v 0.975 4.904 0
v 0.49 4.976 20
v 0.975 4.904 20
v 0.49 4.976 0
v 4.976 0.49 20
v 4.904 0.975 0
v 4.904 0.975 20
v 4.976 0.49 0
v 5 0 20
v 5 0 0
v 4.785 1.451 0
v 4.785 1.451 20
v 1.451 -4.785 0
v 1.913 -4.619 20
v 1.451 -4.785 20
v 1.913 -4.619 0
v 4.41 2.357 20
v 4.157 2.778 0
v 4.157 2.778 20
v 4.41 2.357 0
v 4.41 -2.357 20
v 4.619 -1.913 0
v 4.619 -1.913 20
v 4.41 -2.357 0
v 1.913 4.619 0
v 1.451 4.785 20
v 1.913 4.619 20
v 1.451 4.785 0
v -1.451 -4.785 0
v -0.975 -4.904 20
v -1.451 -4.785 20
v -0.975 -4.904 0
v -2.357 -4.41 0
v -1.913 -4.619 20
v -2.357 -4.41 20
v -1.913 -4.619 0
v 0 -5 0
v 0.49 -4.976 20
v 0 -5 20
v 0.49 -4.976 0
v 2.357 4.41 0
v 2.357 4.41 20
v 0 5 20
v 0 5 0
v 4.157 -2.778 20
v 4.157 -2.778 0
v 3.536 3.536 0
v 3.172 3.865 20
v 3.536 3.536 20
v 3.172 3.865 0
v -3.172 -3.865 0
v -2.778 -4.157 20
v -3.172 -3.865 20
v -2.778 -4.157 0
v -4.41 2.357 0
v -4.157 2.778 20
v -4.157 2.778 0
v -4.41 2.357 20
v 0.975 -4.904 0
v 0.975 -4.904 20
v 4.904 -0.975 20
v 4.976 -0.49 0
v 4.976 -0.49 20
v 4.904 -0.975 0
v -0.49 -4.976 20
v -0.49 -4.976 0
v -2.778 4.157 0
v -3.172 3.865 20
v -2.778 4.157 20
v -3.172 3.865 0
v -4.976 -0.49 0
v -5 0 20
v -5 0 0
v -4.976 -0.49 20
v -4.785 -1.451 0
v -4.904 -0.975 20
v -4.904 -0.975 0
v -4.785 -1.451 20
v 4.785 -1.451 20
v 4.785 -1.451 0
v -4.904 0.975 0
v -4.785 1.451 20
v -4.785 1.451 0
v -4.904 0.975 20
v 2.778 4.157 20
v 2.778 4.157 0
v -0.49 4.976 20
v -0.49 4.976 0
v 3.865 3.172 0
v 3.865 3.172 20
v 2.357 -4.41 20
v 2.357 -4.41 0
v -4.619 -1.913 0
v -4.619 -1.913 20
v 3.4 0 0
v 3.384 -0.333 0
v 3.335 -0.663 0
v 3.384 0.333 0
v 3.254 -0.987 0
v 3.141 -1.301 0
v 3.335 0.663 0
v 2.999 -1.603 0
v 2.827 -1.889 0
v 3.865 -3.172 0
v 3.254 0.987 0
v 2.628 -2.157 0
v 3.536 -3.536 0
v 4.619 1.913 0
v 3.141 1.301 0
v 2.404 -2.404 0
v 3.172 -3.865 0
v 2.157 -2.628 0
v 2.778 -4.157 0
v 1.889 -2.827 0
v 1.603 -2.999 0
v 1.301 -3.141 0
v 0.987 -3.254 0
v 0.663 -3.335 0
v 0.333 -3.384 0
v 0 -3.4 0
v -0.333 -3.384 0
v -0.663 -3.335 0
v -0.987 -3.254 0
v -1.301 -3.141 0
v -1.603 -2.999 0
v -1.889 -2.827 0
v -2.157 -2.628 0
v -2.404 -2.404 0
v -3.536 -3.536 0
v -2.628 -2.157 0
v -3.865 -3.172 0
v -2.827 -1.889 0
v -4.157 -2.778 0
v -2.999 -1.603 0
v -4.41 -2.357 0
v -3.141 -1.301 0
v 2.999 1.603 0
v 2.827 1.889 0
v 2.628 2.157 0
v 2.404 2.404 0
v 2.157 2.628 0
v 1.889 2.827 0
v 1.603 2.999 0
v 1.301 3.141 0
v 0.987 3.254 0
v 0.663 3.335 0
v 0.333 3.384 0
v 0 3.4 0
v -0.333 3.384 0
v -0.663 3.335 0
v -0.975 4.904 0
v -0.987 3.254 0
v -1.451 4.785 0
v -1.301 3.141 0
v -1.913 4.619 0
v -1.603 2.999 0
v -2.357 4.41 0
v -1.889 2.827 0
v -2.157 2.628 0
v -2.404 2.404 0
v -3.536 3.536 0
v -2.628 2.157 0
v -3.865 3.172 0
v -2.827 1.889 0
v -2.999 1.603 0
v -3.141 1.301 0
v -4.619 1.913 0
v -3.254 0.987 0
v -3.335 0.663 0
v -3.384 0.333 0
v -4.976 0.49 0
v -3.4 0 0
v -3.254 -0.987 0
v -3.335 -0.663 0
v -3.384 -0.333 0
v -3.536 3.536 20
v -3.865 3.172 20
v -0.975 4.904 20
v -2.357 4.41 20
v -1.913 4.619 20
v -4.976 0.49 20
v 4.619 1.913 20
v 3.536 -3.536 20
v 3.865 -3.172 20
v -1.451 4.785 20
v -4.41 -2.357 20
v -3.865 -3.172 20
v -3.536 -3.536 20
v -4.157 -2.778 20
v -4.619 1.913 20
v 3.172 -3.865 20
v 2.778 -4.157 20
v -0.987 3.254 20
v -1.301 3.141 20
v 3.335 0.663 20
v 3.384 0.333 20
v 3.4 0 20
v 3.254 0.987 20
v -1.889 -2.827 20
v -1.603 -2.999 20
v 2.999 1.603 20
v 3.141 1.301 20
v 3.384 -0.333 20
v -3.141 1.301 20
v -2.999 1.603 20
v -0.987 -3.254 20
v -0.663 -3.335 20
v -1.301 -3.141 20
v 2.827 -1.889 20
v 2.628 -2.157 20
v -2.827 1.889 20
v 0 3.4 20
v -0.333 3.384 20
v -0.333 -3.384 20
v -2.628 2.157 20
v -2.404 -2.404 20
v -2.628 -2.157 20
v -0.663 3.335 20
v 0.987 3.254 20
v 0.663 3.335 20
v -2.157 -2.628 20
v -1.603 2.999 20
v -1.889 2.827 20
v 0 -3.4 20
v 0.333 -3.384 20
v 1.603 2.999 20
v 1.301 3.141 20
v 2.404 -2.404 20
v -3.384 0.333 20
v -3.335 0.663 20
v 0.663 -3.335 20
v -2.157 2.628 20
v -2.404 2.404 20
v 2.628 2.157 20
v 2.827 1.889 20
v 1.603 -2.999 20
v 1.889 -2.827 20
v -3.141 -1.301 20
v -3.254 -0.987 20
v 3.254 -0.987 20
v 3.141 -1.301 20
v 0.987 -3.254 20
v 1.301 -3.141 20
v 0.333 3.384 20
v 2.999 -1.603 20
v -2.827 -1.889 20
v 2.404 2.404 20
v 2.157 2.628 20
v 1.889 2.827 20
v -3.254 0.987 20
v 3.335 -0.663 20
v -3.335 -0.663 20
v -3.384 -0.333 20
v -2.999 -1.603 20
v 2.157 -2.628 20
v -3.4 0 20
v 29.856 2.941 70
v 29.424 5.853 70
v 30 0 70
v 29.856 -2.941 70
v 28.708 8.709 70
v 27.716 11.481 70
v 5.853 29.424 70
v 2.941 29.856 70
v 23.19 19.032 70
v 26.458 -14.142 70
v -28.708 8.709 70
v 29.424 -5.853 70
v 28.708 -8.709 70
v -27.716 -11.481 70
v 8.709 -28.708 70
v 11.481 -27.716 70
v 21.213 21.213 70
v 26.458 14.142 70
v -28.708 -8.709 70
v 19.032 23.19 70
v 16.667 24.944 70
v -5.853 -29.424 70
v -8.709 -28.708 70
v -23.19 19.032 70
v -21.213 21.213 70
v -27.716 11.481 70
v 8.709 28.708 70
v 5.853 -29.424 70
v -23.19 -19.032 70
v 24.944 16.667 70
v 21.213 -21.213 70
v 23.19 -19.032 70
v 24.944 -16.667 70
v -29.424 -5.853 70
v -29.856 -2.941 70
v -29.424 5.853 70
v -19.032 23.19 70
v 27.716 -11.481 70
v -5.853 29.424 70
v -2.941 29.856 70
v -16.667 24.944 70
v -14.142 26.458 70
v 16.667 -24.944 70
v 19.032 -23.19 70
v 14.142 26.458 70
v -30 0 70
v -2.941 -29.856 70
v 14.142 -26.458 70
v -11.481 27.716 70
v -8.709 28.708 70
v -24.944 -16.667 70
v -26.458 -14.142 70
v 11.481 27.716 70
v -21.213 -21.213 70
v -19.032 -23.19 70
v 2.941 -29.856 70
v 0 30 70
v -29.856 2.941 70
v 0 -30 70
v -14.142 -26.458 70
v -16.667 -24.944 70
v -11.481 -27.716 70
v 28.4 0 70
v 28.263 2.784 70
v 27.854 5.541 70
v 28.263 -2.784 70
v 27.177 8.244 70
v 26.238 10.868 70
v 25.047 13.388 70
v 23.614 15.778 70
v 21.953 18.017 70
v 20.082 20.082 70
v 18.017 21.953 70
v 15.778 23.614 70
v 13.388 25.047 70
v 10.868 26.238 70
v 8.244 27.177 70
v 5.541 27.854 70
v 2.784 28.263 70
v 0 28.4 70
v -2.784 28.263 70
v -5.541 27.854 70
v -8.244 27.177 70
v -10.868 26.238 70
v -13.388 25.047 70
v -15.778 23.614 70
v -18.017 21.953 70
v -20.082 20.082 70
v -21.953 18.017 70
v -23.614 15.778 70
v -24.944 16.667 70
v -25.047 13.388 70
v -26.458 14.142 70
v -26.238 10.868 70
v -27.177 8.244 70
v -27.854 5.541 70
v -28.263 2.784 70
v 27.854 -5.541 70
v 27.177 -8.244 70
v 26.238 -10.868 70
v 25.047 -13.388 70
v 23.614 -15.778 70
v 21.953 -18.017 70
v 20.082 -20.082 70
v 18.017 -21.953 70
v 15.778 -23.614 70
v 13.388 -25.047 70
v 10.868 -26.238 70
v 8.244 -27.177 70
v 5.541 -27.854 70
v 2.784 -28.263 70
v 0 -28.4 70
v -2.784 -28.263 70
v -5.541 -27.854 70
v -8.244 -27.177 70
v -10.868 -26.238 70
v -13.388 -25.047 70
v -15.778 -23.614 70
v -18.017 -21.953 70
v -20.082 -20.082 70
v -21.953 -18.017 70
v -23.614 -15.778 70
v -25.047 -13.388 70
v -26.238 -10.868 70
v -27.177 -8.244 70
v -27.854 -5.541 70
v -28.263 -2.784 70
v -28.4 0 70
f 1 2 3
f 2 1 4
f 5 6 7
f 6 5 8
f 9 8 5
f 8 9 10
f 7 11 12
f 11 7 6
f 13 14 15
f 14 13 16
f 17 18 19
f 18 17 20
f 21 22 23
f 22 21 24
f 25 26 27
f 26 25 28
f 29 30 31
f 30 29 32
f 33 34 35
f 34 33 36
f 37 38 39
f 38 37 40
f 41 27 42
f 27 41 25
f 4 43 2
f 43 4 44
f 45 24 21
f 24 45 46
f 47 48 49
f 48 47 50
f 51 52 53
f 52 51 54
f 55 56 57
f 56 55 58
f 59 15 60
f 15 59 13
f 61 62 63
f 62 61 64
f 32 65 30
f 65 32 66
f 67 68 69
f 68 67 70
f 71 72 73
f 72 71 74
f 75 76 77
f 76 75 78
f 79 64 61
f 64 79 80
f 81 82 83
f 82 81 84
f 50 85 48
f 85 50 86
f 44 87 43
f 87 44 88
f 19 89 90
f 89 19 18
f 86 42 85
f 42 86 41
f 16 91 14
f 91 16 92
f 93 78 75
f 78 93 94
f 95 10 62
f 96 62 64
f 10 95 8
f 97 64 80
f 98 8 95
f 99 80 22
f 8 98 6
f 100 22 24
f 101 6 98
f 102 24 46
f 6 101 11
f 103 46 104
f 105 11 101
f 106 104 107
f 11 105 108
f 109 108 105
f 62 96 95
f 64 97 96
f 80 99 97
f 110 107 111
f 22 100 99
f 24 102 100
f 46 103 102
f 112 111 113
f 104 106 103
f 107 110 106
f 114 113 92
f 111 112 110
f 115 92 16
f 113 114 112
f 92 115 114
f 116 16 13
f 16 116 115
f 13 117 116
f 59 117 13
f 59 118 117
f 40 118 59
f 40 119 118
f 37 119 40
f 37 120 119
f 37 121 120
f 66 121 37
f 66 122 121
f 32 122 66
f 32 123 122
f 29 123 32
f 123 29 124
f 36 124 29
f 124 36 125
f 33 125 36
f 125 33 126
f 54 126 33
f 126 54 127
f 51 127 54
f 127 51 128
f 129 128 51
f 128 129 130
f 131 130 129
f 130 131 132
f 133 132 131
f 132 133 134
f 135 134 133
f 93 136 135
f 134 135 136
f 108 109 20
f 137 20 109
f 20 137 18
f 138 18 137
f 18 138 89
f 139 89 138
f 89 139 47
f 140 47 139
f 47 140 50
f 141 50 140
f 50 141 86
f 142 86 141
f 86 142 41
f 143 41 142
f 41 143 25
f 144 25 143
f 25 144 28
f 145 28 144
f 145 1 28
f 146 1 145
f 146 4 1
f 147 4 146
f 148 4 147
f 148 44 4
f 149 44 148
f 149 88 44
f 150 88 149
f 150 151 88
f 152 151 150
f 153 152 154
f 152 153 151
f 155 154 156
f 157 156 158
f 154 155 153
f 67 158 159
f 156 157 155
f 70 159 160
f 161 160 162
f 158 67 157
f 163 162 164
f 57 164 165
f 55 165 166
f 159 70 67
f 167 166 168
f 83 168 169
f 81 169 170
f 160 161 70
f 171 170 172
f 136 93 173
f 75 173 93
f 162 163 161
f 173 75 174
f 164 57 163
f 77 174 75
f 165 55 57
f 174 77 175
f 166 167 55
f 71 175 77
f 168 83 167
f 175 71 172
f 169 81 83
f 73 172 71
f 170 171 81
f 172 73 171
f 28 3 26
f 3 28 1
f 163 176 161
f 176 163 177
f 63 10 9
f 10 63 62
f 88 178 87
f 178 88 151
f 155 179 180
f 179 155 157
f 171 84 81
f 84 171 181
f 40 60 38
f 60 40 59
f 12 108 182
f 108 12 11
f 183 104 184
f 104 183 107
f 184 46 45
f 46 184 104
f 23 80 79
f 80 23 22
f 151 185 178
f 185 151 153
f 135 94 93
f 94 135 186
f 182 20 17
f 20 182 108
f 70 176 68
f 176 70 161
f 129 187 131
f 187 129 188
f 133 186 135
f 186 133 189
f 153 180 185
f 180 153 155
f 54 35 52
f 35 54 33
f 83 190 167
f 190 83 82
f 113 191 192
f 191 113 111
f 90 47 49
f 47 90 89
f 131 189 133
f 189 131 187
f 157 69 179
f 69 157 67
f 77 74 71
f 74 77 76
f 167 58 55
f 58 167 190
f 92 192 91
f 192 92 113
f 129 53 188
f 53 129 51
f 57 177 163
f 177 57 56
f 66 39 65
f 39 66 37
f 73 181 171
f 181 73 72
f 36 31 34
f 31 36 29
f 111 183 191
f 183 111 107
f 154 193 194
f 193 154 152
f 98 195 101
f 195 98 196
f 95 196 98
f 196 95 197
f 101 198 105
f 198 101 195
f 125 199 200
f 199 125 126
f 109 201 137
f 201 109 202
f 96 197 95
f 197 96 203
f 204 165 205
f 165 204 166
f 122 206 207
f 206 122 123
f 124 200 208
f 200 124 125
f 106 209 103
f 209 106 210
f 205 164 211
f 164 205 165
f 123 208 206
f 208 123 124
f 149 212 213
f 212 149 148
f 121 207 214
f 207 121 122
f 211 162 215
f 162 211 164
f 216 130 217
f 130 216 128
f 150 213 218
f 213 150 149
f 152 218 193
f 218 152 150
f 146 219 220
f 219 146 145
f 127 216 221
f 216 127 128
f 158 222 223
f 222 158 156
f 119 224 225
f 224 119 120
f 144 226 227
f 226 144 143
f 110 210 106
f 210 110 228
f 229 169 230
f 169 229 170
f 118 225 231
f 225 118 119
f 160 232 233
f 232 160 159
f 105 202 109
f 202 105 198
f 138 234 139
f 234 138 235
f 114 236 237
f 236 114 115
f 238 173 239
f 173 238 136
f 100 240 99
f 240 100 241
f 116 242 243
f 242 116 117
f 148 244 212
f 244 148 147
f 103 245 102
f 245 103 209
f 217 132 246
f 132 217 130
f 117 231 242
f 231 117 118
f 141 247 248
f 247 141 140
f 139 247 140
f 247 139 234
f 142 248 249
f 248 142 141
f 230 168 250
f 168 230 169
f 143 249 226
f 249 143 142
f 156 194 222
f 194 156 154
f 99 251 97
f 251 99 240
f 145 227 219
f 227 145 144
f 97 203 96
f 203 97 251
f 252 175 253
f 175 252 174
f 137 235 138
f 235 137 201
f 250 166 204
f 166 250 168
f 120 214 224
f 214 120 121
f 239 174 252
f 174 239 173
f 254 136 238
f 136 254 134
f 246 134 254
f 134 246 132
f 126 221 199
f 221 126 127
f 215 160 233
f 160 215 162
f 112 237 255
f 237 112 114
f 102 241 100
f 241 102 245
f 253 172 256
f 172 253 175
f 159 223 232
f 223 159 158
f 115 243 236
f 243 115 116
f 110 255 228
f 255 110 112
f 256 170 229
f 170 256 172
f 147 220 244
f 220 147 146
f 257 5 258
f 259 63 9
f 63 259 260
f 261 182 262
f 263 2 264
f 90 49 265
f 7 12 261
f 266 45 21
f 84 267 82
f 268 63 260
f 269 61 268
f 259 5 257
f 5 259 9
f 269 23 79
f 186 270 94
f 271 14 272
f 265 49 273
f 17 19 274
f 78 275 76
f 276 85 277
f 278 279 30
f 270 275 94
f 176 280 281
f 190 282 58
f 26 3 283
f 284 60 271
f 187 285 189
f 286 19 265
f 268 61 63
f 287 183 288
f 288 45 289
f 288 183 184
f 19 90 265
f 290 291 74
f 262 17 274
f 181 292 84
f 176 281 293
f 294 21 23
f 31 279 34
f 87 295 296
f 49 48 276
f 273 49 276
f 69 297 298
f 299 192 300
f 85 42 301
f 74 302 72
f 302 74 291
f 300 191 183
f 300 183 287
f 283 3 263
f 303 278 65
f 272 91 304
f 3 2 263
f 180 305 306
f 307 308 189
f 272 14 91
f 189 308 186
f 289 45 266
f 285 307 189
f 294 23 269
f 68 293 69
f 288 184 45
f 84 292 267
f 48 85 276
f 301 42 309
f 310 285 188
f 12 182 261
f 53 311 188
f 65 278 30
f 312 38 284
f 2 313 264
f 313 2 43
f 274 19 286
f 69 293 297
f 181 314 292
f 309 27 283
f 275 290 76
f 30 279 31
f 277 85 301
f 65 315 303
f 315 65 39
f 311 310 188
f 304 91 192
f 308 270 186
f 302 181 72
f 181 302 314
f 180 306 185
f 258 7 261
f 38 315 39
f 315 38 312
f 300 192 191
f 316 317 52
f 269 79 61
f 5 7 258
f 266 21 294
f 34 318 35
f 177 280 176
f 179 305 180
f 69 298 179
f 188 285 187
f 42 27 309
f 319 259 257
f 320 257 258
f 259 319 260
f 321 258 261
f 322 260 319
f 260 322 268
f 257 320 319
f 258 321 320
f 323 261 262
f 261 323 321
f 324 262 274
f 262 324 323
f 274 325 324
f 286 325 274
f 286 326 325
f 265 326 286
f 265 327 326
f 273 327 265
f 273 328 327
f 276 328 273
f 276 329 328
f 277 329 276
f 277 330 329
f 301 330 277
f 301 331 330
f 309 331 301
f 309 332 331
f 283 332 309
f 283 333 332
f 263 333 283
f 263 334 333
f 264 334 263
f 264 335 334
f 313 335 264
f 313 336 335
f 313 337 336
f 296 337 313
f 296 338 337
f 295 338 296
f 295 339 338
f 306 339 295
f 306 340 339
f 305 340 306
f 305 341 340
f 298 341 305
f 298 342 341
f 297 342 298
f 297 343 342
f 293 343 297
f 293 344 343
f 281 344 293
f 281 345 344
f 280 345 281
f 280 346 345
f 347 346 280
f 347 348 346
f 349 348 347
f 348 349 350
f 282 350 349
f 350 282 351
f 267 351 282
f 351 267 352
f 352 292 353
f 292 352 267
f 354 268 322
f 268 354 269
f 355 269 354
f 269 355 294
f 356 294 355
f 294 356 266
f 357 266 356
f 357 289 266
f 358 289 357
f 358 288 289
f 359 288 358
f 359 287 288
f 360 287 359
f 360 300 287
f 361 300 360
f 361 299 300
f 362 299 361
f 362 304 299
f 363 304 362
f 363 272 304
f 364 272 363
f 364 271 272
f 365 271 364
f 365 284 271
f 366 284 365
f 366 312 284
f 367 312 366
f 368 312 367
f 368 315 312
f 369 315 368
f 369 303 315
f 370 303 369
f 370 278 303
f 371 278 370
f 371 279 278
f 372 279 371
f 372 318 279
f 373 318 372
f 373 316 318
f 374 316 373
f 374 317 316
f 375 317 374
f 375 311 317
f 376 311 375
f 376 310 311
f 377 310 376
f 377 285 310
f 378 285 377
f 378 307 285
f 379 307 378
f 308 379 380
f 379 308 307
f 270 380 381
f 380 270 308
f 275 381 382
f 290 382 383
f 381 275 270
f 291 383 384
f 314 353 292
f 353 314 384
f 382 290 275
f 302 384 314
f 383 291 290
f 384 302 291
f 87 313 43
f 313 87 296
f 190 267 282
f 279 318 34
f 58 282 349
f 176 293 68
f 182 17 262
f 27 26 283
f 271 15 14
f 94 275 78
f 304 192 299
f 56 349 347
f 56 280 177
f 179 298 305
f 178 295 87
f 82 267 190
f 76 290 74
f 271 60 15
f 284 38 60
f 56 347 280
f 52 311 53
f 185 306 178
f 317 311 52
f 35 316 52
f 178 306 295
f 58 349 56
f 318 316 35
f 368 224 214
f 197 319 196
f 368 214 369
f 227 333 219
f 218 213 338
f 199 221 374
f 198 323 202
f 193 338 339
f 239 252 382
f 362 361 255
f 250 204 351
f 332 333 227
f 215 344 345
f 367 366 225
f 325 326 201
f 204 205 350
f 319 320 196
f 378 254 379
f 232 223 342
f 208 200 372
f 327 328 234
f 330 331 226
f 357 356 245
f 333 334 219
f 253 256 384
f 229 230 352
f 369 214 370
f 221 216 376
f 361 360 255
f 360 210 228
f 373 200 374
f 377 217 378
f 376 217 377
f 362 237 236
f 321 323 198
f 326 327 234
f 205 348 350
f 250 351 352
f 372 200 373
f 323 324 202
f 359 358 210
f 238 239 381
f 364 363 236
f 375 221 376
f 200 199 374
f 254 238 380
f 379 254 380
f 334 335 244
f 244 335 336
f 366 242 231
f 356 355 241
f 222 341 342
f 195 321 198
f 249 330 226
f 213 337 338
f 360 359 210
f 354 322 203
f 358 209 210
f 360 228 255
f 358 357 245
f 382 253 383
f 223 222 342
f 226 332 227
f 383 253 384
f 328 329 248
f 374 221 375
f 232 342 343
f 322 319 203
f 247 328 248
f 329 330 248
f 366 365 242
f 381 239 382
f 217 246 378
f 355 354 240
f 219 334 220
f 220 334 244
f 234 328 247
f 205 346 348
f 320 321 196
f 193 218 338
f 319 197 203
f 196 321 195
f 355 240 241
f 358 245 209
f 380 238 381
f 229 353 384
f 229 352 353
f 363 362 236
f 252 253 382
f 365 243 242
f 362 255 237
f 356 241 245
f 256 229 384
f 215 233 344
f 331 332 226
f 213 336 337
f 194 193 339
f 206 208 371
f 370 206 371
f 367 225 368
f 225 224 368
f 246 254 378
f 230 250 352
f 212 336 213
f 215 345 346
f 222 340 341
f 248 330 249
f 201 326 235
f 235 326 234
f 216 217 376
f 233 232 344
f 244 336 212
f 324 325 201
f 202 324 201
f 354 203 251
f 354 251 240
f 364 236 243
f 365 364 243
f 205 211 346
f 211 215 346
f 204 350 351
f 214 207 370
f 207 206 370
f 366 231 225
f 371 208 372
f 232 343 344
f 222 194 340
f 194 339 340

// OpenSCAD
// Dimensions for the Lab Funnel
funnel_height = 50;      // Total height of the funnel in mm
spout_length = 20;       // Length of the straight spout section in mm
spout_od = 10;           // Outer diameter of the spout (mm)
spout_id = spout_od - 2 * 1.6; // Inner diameter/bore of the spout (10 - 3.2 = 6.8 mm)
cone_base_od = spout_od;  // Outer diameter at z=20 is the same as the spout OD
cone_rim_od = 60;         // Outer diameter at the rim (z=50)
wall_thickness = 1.6;     // Wall thickness of the funnel in mm

// --- Main Funnel Body Construction ---

// 1. Straight Spout Section (z=0 to z=20)
translate([0, 0, 0]) {
    difference() {
        // Outer shape of the spout
        cylinder(h = spout_length, r = spout_od / 2, $fn = 64);

        // Inner bore (cut out)
        translate([0, 0, -0.01]) { // Offset slightly to ensure clean cut
            cylinder(h = spout_length + 0.02, r = spout_id / 2, $fn = 64);
        }
    }
}

// 2. Conical Section (z=20 to z=50)
translate([0, 0, spout_length]) {
    difference() {
        // Outer cone shape
        // We use a hull or a series of cylinders/spheres for a smooth cone approximation.
        // For simplicity and robustness in OpenSCAD, we approximate the cone using a cylinder sweep or by defining the profile.
        // Since it's a simple cone, we will use a series of stacked cylinders or a hull if possible.
        // A simpler approach is to use a shape that defines the outer boundary:
        hull() {
            translate([0, 0, 0])
                cylinder(h = funnel_height, r1 = cone_base_od / 2, r2 = cone_rim_od / 2, $fn = 64);
        }

        // Inner bore (cut out) - This is complex for a smooth cone. We approximate the inner radius at z=50.
        // Inner rim OD at z=50: 60 - 2 * wall_thickness = 56.8 mm
        // Inner base OD at z=20: 10 - 2 * wall_thickness = 6.8 mm

        // To create the inner bore, we define an inner cone shape and subtract it.
        translate([0, 0, 0]) {
            hull() {
                translate([0, 0, 0])
                    cylinder(h = funnel_height, r1 = (cone_base_od - 2 * wall_thickness) / 2, r2 = (cone_rim_od - 2 * wall_thickness) / 2, $fn = 64);
            }
        }
    }
}

// Note on open ends: The requirement states the funnel is open at the top and bottom.
// Since we are modeling a solid object that runs through, the openings are implicitly defined by the geometry where the material is absent (the bore).
// For printing, these open ends will be visible gaps in the structure.
